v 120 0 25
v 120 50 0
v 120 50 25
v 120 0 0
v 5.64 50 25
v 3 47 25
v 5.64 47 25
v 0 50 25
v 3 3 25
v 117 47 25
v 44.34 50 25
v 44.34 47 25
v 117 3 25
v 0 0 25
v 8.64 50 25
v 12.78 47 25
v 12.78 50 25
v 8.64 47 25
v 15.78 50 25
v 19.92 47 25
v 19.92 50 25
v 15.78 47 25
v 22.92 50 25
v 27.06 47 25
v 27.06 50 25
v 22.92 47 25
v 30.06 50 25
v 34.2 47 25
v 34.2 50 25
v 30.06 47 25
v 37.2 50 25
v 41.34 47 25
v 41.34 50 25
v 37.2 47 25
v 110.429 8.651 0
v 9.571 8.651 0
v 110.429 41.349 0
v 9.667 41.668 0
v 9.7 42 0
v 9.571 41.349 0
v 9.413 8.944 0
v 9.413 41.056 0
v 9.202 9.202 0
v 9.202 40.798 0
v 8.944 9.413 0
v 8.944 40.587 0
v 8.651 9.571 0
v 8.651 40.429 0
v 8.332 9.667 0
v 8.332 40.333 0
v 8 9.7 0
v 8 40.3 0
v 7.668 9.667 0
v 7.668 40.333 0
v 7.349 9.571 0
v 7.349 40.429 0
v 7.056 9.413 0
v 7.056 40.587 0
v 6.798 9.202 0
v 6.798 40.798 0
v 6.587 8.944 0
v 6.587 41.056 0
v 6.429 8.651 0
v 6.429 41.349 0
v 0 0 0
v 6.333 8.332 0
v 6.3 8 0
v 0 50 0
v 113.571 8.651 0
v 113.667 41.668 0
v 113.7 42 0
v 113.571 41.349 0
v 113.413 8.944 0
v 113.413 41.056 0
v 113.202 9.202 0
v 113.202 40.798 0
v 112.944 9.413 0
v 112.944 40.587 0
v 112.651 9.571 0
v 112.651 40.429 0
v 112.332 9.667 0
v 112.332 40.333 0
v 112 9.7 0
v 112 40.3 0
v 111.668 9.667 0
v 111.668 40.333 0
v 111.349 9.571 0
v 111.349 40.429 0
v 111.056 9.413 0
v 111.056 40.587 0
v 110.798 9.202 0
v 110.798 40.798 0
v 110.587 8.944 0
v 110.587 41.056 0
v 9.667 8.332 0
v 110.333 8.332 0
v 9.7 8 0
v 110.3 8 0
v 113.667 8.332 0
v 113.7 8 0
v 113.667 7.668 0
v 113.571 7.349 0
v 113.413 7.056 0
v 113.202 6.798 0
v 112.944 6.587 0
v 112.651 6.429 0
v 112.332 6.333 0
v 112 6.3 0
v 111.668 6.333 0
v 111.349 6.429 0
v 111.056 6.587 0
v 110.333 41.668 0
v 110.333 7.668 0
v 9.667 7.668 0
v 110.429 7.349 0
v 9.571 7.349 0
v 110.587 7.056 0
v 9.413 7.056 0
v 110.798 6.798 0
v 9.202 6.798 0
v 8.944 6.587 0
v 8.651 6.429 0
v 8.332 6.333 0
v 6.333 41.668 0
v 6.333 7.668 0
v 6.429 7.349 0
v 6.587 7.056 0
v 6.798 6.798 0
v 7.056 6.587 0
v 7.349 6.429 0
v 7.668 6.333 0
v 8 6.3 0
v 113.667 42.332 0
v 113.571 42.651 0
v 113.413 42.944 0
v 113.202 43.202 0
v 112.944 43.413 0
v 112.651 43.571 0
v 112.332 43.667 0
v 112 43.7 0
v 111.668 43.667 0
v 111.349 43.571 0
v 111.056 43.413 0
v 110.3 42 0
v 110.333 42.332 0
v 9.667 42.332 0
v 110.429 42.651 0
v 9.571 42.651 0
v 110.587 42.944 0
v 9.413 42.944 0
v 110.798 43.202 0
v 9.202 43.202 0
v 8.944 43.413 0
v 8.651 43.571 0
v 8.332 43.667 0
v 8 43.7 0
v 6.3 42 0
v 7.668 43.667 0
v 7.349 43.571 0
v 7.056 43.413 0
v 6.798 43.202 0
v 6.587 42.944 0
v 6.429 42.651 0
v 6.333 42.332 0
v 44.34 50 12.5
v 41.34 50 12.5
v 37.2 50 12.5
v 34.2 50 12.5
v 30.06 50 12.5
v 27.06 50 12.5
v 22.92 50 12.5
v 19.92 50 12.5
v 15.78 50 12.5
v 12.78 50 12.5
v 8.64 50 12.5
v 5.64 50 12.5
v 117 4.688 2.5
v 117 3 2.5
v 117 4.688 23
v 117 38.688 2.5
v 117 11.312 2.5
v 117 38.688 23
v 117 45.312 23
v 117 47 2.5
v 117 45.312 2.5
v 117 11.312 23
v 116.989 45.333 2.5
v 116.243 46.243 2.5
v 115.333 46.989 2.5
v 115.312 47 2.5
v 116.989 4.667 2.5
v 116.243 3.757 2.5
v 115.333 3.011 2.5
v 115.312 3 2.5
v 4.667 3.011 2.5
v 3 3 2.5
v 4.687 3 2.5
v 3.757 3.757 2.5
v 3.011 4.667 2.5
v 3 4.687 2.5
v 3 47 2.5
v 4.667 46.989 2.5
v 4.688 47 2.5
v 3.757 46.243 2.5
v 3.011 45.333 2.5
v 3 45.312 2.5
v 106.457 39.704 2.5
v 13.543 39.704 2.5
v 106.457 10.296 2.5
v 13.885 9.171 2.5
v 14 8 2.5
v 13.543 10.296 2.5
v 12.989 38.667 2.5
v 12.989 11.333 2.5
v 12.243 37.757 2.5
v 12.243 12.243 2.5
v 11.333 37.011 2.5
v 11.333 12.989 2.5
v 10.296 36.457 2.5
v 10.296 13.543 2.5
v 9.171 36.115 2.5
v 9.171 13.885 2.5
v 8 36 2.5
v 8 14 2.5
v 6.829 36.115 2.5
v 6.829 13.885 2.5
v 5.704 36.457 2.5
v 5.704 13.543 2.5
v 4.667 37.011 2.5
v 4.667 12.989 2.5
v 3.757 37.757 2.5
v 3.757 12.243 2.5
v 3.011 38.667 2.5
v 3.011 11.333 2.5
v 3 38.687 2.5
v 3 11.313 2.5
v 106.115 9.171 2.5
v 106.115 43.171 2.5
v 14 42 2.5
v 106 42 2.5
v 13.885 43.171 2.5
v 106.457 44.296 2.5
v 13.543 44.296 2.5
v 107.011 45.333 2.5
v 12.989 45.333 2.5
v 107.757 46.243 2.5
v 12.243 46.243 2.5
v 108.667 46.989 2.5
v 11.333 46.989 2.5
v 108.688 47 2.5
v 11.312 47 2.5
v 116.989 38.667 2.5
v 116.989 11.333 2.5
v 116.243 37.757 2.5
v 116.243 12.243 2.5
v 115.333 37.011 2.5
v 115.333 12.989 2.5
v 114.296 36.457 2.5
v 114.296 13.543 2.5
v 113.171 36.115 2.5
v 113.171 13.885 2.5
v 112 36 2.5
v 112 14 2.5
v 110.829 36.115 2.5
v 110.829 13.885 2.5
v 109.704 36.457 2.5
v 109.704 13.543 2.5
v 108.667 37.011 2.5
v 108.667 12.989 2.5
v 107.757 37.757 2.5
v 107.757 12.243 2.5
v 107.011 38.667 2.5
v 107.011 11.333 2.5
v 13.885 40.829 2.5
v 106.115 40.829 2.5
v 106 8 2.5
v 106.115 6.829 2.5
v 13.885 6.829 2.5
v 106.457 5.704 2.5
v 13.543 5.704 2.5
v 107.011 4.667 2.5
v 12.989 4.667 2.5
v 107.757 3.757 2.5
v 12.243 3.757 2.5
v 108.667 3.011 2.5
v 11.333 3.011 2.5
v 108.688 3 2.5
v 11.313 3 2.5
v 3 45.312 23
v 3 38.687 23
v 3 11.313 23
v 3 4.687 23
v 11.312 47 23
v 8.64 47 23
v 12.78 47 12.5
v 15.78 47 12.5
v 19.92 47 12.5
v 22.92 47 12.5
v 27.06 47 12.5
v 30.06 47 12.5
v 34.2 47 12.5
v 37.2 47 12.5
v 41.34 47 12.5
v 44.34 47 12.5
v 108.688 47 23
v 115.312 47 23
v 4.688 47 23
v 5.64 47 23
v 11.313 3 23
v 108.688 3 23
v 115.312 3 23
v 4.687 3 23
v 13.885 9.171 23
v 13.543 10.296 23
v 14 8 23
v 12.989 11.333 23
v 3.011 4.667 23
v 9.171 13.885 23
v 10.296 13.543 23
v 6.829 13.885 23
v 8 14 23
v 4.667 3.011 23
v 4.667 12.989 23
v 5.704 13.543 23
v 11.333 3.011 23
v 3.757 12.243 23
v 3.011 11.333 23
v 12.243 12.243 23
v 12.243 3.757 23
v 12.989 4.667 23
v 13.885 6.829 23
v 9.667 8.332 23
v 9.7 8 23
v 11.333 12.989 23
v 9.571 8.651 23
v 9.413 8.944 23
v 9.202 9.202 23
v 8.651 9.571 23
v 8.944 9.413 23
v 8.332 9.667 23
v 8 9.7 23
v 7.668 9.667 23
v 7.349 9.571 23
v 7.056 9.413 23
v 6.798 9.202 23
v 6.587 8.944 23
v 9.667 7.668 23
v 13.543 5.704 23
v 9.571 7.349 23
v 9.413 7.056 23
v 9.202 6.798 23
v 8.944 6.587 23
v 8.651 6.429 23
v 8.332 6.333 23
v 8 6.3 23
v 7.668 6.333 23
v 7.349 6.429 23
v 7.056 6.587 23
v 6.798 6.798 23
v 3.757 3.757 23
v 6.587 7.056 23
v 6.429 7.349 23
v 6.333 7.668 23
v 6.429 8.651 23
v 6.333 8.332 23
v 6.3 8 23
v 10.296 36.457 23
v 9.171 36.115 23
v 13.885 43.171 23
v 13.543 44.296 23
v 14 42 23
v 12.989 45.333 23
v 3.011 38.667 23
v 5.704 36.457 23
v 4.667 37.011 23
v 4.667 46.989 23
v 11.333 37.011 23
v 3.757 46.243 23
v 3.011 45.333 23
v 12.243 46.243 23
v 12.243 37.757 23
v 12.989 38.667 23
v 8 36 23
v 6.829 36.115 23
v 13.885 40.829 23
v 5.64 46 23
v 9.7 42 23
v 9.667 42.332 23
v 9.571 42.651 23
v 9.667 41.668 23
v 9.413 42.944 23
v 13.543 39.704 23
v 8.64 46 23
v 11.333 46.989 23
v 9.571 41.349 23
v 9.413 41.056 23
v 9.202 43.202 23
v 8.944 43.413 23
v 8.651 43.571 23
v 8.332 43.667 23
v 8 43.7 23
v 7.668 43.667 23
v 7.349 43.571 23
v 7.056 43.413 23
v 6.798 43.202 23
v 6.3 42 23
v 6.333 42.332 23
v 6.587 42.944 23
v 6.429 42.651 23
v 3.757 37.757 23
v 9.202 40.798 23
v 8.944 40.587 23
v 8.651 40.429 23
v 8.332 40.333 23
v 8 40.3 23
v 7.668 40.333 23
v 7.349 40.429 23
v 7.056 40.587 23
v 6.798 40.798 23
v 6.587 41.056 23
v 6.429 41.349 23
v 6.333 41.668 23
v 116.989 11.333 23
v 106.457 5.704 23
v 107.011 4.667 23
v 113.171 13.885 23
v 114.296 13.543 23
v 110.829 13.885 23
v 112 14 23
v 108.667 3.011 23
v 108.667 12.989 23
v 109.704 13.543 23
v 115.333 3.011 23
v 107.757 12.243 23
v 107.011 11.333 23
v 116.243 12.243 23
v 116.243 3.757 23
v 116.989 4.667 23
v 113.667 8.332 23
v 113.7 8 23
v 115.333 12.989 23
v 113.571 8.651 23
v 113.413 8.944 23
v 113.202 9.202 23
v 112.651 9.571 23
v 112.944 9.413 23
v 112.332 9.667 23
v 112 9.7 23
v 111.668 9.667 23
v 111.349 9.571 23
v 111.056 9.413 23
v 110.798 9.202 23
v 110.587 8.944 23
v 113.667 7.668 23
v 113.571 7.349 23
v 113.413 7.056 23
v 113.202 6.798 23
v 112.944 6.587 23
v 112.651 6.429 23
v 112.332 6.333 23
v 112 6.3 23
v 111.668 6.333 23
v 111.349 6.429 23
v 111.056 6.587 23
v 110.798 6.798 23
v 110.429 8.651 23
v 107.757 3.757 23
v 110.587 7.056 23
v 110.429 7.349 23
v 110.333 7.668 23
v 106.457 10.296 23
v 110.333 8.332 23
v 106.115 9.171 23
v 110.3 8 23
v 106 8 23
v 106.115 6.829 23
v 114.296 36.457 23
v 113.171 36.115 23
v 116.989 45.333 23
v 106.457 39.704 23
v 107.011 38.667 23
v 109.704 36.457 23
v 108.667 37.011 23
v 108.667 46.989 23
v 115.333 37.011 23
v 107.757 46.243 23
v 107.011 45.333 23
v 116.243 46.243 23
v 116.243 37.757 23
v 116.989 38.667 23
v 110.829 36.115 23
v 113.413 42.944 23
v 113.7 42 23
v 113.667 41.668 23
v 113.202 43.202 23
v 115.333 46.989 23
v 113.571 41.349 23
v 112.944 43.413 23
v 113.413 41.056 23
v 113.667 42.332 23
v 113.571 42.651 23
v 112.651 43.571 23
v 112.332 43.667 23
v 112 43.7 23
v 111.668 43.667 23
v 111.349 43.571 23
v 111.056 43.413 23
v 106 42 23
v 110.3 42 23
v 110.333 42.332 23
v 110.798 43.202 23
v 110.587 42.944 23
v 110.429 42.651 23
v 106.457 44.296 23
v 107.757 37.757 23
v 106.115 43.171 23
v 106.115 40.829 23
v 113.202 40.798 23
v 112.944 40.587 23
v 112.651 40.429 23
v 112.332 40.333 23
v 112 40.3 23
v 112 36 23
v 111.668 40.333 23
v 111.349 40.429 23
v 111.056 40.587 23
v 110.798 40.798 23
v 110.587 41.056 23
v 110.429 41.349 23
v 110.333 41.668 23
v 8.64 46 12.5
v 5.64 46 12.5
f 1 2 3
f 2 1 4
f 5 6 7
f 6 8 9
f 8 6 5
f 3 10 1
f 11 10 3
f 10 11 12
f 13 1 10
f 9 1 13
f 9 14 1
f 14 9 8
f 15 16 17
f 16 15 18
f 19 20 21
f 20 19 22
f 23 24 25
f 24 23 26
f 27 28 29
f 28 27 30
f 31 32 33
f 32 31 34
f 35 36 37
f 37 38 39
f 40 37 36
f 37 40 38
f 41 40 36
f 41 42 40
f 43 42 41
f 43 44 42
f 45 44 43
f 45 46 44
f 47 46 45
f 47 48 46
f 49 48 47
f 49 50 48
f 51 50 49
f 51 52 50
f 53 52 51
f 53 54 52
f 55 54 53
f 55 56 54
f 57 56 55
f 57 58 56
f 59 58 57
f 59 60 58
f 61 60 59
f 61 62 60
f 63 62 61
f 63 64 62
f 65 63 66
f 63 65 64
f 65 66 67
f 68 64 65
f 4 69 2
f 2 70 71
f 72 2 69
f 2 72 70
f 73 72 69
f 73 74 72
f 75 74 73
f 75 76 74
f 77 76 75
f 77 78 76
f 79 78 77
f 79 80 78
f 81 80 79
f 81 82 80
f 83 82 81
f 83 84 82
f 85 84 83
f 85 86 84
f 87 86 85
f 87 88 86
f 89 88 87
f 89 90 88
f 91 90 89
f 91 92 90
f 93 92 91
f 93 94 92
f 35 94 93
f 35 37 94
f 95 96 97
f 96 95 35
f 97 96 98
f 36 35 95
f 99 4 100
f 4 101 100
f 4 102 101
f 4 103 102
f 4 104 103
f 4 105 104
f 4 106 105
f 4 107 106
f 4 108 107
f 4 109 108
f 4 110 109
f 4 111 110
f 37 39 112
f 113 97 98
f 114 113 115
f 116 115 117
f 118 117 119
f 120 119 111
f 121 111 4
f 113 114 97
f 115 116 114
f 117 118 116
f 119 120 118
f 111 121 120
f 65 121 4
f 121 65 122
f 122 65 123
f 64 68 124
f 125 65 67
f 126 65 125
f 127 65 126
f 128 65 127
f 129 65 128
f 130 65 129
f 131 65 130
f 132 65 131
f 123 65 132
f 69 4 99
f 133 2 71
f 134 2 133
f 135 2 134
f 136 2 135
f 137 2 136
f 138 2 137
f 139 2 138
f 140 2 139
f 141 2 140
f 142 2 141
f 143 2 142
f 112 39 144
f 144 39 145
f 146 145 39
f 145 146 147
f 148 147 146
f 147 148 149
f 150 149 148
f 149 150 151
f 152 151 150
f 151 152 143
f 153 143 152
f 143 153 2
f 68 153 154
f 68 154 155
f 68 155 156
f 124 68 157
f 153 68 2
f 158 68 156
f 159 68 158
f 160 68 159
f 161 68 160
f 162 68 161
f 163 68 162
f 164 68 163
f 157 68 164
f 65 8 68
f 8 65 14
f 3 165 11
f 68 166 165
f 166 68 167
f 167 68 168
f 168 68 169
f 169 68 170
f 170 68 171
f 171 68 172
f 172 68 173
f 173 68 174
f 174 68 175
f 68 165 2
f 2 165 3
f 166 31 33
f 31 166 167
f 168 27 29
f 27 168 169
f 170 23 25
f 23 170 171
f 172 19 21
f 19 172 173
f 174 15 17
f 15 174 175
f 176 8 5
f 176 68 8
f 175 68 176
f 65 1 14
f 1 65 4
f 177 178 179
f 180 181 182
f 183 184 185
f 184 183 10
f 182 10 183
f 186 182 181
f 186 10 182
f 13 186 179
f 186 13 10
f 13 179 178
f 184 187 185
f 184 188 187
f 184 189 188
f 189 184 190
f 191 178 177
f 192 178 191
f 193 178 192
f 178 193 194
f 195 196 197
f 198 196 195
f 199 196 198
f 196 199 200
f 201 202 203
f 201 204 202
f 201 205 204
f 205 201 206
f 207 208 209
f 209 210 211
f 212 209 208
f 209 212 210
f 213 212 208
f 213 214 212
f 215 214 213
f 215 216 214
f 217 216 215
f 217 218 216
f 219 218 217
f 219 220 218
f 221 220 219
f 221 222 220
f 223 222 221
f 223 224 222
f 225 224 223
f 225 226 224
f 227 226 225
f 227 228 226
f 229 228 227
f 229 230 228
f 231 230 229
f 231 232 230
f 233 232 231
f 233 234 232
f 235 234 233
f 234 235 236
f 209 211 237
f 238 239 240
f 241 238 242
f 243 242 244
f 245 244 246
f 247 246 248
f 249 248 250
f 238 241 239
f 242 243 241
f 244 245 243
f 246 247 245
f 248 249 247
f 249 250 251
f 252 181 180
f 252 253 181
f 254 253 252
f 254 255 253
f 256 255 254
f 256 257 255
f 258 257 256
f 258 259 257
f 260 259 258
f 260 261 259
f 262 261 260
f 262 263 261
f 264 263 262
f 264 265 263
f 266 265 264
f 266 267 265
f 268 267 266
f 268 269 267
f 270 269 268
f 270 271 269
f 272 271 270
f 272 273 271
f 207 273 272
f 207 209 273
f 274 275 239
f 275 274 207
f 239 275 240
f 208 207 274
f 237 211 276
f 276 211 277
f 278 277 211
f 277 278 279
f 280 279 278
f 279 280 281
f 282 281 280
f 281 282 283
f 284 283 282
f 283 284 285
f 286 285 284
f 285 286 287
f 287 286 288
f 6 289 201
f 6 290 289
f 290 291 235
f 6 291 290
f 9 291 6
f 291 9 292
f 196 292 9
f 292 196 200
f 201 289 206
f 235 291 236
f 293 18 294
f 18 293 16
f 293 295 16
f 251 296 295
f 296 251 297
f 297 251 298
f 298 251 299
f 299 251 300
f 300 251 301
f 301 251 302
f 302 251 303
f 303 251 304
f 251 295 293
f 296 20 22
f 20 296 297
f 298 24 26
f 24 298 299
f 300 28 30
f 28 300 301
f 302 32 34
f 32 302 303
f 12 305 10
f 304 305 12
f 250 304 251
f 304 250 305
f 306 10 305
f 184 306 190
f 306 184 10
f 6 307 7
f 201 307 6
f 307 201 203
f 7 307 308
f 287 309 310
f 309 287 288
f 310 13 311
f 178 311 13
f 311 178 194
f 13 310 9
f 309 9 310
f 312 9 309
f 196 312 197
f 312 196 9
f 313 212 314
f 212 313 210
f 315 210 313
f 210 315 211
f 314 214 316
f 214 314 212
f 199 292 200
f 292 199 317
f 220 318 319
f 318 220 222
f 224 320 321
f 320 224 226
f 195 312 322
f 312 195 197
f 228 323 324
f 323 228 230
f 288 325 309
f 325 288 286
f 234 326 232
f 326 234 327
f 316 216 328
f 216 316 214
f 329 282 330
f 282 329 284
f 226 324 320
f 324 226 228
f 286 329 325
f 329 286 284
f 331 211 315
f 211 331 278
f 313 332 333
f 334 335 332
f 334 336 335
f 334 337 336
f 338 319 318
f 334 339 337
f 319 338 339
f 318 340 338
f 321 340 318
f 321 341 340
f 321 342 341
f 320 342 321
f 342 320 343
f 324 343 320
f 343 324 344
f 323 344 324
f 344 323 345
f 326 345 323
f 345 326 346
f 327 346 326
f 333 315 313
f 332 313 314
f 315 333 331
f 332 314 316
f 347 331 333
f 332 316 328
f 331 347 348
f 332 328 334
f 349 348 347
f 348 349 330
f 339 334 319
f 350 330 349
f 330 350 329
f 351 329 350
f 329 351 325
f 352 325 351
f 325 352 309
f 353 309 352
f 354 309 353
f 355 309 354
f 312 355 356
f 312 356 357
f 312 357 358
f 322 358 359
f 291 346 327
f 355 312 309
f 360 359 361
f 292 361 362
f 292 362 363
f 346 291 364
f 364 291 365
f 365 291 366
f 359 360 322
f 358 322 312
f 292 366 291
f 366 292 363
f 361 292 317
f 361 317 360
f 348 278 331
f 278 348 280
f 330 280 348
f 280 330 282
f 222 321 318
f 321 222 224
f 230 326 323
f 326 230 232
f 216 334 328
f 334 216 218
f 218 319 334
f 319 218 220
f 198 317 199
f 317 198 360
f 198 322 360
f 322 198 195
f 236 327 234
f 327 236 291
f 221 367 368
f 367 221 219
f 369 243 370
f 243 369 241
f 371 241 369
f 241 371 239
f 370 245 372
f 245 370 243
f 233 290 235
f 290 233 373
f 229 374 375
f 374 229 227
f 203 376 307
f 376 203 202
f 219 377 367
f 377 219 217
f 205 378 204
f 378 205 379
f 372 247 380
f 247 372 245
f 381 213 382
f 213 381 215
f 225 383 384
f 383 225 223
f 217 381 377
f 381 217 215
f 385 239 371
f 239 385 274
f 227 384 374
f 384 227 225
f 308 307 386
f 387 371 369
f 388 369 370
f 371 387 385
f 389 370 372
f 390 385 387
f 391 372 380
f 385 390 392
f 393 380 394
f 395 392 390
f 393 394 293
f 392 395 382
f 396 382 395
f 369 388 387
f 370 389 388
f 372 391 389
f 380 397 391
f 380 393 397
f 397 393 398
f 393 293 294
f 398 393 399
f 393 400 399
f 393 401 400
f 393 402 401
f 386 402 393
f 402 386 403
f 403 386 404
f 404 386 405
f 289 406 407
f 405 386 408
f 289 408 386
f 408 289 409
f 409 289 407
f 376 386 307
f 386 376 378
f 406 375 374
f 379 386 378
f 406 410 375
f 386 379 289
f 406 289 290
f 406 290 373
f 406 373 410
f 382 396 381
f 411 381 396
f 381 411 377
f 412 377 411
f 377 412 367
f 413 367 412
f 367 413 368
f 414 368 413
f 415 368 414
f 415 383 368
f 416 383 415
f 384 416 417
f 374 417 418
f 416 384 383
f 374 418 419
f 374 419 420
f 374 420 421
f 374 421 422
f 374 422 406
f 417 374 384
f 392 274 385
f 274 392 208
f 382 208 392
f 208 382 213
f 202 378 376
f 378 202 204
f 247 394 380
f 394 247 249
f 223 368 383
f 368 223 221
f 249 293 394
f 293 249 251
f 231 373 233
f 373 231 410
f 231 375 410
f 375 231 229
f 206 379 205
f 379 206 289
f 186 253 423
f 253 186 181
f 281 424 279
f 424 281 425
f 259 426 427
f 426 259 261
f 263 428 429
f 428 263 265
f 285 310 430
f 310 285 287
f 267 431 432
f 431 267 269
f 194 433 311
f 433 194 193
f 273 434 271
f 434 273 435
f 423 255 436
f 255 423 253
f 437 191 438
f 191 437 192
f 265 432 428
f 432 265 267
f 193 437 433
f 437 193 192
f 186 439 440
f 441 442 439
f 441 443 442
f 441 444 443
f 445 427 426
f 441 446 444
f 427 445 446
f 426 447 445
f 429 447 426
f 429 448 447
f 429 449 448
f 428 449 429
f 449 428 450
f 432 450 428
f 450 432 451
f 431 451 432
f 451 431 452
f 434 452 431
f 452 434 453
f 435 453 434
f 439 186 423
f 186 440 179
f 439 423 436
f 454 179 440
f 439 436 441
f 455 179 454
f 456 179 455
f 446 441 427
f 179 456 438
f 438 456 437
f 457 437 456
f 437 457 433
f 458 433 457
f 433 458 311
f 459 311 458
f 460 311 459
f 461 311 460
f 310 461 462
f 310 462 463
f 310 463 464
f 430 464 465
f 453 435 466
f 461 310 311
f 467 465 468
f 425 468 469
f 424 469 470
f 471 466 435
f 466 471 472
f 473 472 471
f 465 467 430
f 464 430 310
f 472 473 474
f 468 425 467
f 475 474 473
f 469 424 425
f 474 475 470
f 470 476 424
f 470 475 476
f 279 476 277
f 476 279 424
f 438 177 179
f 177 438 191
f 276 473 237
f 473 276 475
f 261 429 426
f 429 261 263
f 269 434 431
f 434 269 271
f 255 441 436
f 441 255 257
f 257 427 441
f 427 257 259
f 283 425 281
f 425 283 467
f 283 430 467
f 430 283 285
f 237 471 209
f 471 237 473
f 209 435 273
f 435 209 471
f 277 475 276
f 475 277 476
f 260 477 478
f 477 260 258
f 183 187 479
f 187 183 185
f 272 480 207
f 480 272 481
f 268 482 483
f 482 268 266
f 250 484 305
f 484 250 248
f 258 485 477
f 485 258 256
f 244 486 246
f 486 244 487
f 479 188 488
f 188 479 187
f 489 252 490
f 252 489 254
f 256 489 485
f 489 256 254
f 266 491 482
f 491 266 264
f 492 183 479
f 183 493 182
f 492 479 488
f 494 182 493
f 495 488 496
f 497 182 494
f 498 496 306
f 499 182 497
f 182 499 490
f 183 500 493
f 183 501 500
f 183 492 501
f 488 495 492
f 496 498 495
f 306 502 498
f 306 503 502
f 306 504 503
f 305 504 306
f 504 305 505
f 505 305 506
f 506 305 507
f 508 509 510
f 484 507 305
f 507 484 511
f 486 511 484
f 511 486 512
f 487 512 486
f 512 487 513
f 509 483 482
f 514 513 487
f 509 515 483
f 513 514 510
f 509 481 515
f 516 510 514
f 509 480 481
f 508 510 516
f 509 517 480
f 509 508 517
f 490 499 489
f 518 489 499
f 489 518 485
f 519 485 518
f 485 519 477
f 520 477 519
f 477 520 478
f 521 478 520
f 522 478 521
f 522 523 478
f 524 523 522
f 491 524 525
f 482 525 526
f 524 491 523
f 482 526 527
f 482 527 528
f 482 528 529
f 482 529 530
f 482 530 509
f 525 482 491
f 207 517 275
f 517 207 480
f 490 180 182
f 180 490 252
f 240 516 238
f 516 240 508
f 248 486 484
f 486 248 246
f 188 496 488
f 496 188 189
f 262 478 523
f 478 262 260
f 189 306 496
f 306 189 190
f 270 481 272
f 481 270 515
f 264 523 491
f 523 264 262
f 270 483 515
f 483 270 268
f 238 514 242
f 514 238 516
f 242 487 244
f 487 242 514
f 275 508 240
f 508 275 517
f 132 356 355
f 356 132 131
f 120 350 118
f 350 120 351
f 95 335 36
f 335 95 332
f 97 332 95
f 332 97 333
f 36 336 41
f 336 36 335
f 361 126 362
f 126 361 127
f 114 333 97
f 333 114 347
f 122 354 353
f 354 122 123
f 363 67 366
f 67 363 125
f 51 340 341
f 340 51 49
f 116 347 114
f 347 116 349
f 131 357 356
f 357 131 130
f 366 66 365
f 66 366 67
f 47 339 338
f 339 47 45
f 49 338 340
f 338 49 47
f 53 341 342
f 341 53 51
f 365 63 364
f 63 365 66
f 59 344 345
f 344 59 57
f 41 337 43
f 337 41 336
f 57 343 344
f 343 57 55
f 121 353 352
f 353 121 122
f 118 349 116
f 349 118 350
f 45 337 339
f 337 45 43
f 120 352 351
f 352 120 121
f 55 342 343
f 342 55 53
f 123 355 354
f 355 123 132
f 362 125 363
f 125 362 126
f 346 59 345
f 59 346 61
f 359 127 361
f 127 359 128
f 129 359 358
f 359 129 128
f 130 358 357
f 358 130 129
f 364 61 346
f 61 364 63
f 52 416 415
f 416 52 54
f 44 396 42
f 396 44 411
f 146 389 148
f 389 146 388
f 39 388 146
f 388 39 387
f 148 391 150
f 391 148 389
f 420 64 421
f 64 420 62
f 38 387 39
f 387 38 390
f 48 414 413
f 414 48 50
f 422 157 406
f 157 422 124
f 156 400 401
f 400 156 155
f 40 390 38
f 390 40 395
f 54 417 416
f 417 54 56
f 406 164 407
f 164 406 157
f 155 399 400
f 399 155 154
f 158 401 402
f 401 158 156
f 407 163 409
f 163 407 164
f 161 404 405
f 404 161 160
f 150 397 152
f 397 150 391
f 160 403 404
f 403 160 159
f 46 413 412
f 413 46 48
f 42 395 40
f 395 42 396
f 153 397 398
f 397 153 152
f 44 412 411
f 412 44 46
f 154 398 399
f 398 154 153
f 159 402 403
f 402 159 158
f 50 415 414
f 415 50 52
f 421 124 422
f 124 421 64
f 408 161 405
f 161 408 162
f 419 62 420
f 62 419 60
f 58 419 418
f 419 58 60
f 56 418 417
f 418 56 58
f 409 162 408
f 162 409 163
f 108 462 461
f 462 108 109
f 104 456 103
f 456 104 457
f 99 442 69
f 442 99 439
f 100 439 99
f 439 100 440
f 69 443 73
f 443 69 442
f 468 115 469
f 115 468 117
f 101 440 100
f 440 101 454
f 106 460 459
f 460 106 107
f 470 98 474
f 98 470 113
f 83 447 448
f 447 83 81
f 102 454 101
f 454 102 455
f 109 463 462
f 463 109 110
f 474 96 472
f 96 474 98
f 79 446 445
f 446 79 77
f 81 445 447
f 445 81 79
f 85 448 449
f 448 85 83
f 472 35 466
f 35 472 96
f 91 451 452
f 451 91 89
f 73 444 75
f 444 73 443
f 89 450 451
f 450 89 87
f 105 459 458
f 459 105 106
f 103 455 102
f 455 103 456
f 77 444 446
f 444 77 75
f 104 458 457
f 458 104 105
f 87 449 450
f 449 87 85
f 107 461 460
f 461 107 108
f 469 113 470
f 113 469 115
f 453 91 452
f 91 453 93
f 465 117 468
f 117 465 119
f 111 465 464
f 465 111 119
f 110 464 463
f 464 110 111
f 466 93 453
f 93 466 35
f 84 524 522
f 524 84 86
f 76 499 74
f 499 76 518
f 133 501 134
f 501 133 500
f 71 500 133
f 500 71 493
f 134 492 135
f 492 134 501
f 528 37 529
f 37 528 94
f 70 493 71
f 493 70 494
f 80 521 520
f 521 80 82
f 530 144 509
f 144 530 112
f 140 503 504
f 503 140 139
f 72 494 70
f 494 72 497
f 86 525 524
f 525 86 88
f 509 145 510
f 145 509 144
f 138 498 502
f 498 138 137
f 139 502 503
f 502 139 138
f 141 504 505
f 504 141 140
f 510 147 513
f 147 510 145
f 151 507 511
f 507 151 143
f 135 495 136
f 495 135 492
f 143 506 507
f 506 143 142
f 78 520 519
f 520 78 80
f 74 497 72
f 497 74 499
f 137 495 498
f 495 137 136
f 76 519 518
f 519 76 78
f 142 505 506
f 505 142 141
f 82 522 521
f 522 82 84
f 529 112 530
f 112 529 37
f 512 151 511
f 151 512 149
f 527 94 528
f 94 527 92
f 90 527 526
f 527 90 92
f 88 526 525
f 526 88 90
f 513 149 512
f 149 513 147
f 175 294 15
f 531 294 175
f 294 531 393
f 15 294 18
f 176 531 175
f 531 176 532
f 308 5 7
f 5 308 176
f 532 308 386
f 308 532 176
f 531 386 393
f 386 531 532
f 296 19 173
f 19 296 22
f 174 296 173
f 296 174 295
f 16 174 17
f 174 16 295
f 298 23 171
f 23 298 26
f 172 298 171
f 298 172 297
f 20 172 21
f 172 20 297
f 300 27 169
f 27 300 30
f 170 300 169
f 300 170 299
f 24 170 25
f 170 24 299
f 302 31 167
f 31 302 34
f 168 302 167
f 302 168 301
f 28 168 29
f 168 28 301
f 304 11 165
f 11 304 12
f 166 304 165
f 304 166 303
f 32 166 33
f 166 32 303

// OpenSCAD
$fn = 32;

// ----------------------------------------------------------------------
// Enclosure body: 120 x 50 x 25 mm, wall 3 mm
// ----------------------------------------------------------------------

// --- parameters (mm) ---
length = 120;             // outside length, X
width = 50;               // outside width, Y
height = 25;              // outside height, Z
wall = 3;                 // side wall thickness
floor_t = 2.5;            // floor thickness
boss_d = 12;              // corner boss diameter
boss_h = 20.5;            // corner boss height above the floor
boss_hole_d = 3.4;        // lid screw clearance in the boss
boss_lip = 8;             // boss centre inset from the corner
vent_slots = 6;           // vent slots in the long wall
vent_w = 3;               // vent slot width
vent_h = 25;              // vent slot height
vent_pitch = 7.14;        // vent slot pitch
vent_z = 12.5;            // vent slot sill height

module shell() {
  difference() {
    cube([length, width, height]);
    /* hollow, open at the top */
    translate([wall, wall, floor_t])
      cube([length - 2 * wall, width - 2 * wall, height]);
  }
}

module bosses() {
  /* corner bosses, sunk 1 mm into the floor */
  for (sx = [0, 1]) for (sy = [0, 1])
    translate([sx * (length - 2 * boss_lip) + boss_lip, sy * (width - 2 * boss_lip) + boss_lip, floor_t - 1])
      cylinder(h = boss_h + 1, d = boss_d);
}

difference() {
  union() {
    shell();
    bosses();
  }
  /* boss screw holes */
  for (sx = [0, 1]) for (sy = [0, 1])
    translate([sx * (length - 2 * boss_lip) + boss_lip, sy * (width - 2 * boss_lip) + boss_lip, -1]) cylinder(h = floor_t + boss_h + 2, d = boss_hole_d);
  /* vent grille in the +Y wall */
  for (i = [0 : vent_slots - 1]) translate([vent_pitch * (i + 1) - vent_w / 2, width - wall - 1, vent_z]) cube([vent_w, wall + 2, vent_h]);
}
